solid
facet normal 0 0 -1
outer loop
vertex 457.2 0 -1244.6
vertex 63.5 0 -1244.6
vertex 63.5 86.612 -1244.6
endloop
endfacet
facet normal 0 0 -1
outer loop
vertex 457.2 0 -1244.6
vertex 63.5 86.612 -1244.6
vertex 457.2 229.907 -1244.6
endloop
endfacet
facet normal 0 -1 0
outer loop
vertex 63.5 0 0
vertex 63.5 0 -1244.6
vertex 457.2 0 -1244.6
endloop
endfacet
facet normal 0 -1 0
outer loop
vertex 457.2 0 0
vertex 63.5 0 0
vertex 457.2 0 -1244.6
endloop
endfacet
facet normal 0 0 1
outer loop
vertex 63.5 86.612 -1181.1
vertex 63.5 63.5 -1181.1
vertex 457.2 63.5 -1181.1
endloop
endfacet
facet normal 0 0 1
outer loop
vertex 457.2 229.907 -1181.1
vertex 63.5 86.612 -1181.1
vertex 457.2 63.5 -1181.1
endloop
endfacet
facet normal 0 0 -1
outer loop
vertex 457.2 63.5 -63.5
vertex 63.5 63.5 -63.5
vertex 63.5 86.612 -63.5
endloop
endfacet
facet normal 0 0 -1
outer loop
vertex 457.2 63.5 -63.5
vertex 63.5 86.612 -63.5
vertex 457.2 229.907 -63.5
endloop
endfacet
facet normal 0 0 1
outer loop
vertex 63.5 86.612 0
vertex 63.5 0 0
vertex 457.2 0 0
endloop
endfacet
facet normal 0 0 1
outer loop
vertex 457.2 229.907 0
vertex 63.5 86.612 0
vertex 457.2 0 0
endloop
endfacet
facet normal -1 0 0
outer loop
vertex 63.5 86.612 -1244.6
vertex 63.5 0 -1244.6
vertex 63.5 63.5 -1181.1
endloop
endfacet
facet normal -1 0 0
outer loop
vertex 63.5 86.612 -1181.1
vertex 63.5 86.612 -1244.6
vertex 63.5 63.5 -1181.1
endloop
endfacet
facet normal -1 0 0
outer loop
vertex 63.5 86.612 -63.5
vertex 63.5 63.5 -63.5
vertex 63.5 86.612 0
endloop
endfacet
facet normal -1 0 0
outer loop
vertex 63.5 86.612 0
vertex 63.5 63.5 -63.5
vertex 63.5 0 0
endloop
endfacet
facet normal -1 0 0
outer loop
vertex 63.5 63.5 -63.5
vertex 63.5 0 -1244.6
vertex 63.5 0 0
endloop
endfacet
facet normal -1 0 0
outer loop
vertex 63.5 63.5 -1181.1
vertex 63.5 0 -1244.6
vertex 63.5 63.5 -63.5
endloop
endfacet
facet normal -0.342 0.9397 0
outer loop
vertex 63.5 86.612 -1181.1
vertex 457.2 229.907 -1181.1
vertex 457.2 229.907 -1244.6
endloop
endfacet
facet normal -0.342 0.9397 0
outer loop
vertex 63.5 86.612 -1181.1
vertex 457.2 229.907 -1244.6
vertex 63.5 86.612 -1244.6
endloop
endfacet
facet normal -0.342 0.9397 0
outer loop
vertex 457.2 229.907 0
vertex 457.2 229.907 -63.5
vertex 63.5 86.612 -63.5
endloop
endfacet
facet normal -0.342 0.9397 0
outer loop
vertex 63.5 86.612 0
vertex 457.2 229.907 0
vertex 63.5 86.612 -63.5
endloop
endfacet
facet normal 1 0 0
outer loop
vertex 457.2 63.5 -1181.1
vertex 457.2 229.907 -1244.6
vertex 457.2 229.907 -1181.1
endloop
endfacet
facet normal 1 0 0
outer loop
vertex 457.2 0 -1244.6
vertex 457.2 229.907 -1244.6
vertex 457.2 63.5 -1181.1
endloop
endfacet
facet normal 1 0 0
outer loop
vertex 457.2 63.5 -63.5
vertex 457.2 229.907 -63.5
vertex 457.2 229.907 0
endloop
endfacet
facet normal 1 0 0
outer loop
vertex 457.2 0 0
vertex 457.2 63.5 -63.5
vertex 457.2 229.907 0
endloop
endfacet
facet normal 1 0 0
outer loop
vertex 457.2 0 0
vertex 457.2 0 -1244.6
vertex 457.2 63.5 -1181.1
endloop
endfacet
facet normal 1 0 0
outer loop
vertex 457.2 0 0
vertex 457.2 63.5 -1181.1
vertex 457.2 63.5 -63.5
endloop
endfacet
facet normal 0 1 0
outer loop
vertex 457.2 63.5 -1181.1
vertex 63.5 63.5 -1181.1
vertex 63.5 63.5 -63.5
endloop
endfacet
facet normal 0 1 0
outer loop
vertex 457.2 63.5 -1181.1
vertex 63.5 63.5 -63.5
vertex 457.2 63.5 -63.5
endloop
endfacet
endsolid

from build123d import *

# Parameters (mm, degrees)
SKETCH1_W           = 457.2
SKETCH1_H           = 1244.6
BOSS_EXTRUDE1_DEPTH = 63.5
SKETCH4_W           = 457.2
SKETCH4_H           = 63.5
BOSS_EXTRUDE2_DEPTH = 266.7
CUT_EXTRUDE7_DEPTH  = 100.076
SKETCH12_W          = 63.5
SKETCH12_H          = 1244.6
CUT_EXTRUDE8_DEPTH  = 253.746


with BuildPart() as part:
    # Sketch1 → Boss-Extrude1 (new body)
    with BuildSketch(Plane(origin=(0, 0, 0), x_dir=(1, 0, 0), z_dir=(0, 1, 0))):
        with Locations((228.6, 622.3)):
            Rectangle(SKETCH1_W, SKETCH1_H)
    extrude(amount=BOSS_EXTRUDE1_DEPTH)

    # Sketch4 → Boss-Extrude2 (add)
    with BuildSketch(Plane(origin=(0, 63.5, 0), x_dir=(1, 0, 0), z_dir=(0, 1, 0))):
        with Locations((228.6, 1212.85)):
            Rectangle(SKETCH4_W, SKETCH4_H)
    boss_extrude2 = extrude(amount=BOSS_EXTRUDE2_DEPTH)

    # Mirror7: Boss-Extrude2 across plane
    add(boss_extrude2.mirror(Plane(origin=(0, 0, -622.3), x_dir=(1, 0, 0), z_dir=(0, 0, -1))))

    # Sketch11 → Cut-Extrude7 (cut)
    with BuildSketch(Plane.XY.offset(-1181.1)):
        Polygon((0, 63.5), (0, 330.2), (457.2, 330.2), (457.2, 229.907191107), align=None)
    cut_extrude7 = extrude(amount=-CUT_EXTRUDE7_DEPTH, mode=Mode.SUBTRACT)

    # Mirror8: Cut-Extrude7 across plane
    add(cut_extrude7.mirror(Plane(origin=(0, 0, -622.3), x_dir=(1, 0, 0), z_dir=(0, 0, -1))), mode=Mode.SUBTRACT)

    # Sketch12 → Cut-Extrude8 (cut)
    with BuildSketch(Plane.XZ):
        with Locations((31.75, -622.3)):
            Rectangle(SKETCH12_W, SKETCH12_H)
    extrude(amount=-CUT_EXTRUDE8_DEPTH, mode=Mode.SUBTRACT)


solid = part.part
